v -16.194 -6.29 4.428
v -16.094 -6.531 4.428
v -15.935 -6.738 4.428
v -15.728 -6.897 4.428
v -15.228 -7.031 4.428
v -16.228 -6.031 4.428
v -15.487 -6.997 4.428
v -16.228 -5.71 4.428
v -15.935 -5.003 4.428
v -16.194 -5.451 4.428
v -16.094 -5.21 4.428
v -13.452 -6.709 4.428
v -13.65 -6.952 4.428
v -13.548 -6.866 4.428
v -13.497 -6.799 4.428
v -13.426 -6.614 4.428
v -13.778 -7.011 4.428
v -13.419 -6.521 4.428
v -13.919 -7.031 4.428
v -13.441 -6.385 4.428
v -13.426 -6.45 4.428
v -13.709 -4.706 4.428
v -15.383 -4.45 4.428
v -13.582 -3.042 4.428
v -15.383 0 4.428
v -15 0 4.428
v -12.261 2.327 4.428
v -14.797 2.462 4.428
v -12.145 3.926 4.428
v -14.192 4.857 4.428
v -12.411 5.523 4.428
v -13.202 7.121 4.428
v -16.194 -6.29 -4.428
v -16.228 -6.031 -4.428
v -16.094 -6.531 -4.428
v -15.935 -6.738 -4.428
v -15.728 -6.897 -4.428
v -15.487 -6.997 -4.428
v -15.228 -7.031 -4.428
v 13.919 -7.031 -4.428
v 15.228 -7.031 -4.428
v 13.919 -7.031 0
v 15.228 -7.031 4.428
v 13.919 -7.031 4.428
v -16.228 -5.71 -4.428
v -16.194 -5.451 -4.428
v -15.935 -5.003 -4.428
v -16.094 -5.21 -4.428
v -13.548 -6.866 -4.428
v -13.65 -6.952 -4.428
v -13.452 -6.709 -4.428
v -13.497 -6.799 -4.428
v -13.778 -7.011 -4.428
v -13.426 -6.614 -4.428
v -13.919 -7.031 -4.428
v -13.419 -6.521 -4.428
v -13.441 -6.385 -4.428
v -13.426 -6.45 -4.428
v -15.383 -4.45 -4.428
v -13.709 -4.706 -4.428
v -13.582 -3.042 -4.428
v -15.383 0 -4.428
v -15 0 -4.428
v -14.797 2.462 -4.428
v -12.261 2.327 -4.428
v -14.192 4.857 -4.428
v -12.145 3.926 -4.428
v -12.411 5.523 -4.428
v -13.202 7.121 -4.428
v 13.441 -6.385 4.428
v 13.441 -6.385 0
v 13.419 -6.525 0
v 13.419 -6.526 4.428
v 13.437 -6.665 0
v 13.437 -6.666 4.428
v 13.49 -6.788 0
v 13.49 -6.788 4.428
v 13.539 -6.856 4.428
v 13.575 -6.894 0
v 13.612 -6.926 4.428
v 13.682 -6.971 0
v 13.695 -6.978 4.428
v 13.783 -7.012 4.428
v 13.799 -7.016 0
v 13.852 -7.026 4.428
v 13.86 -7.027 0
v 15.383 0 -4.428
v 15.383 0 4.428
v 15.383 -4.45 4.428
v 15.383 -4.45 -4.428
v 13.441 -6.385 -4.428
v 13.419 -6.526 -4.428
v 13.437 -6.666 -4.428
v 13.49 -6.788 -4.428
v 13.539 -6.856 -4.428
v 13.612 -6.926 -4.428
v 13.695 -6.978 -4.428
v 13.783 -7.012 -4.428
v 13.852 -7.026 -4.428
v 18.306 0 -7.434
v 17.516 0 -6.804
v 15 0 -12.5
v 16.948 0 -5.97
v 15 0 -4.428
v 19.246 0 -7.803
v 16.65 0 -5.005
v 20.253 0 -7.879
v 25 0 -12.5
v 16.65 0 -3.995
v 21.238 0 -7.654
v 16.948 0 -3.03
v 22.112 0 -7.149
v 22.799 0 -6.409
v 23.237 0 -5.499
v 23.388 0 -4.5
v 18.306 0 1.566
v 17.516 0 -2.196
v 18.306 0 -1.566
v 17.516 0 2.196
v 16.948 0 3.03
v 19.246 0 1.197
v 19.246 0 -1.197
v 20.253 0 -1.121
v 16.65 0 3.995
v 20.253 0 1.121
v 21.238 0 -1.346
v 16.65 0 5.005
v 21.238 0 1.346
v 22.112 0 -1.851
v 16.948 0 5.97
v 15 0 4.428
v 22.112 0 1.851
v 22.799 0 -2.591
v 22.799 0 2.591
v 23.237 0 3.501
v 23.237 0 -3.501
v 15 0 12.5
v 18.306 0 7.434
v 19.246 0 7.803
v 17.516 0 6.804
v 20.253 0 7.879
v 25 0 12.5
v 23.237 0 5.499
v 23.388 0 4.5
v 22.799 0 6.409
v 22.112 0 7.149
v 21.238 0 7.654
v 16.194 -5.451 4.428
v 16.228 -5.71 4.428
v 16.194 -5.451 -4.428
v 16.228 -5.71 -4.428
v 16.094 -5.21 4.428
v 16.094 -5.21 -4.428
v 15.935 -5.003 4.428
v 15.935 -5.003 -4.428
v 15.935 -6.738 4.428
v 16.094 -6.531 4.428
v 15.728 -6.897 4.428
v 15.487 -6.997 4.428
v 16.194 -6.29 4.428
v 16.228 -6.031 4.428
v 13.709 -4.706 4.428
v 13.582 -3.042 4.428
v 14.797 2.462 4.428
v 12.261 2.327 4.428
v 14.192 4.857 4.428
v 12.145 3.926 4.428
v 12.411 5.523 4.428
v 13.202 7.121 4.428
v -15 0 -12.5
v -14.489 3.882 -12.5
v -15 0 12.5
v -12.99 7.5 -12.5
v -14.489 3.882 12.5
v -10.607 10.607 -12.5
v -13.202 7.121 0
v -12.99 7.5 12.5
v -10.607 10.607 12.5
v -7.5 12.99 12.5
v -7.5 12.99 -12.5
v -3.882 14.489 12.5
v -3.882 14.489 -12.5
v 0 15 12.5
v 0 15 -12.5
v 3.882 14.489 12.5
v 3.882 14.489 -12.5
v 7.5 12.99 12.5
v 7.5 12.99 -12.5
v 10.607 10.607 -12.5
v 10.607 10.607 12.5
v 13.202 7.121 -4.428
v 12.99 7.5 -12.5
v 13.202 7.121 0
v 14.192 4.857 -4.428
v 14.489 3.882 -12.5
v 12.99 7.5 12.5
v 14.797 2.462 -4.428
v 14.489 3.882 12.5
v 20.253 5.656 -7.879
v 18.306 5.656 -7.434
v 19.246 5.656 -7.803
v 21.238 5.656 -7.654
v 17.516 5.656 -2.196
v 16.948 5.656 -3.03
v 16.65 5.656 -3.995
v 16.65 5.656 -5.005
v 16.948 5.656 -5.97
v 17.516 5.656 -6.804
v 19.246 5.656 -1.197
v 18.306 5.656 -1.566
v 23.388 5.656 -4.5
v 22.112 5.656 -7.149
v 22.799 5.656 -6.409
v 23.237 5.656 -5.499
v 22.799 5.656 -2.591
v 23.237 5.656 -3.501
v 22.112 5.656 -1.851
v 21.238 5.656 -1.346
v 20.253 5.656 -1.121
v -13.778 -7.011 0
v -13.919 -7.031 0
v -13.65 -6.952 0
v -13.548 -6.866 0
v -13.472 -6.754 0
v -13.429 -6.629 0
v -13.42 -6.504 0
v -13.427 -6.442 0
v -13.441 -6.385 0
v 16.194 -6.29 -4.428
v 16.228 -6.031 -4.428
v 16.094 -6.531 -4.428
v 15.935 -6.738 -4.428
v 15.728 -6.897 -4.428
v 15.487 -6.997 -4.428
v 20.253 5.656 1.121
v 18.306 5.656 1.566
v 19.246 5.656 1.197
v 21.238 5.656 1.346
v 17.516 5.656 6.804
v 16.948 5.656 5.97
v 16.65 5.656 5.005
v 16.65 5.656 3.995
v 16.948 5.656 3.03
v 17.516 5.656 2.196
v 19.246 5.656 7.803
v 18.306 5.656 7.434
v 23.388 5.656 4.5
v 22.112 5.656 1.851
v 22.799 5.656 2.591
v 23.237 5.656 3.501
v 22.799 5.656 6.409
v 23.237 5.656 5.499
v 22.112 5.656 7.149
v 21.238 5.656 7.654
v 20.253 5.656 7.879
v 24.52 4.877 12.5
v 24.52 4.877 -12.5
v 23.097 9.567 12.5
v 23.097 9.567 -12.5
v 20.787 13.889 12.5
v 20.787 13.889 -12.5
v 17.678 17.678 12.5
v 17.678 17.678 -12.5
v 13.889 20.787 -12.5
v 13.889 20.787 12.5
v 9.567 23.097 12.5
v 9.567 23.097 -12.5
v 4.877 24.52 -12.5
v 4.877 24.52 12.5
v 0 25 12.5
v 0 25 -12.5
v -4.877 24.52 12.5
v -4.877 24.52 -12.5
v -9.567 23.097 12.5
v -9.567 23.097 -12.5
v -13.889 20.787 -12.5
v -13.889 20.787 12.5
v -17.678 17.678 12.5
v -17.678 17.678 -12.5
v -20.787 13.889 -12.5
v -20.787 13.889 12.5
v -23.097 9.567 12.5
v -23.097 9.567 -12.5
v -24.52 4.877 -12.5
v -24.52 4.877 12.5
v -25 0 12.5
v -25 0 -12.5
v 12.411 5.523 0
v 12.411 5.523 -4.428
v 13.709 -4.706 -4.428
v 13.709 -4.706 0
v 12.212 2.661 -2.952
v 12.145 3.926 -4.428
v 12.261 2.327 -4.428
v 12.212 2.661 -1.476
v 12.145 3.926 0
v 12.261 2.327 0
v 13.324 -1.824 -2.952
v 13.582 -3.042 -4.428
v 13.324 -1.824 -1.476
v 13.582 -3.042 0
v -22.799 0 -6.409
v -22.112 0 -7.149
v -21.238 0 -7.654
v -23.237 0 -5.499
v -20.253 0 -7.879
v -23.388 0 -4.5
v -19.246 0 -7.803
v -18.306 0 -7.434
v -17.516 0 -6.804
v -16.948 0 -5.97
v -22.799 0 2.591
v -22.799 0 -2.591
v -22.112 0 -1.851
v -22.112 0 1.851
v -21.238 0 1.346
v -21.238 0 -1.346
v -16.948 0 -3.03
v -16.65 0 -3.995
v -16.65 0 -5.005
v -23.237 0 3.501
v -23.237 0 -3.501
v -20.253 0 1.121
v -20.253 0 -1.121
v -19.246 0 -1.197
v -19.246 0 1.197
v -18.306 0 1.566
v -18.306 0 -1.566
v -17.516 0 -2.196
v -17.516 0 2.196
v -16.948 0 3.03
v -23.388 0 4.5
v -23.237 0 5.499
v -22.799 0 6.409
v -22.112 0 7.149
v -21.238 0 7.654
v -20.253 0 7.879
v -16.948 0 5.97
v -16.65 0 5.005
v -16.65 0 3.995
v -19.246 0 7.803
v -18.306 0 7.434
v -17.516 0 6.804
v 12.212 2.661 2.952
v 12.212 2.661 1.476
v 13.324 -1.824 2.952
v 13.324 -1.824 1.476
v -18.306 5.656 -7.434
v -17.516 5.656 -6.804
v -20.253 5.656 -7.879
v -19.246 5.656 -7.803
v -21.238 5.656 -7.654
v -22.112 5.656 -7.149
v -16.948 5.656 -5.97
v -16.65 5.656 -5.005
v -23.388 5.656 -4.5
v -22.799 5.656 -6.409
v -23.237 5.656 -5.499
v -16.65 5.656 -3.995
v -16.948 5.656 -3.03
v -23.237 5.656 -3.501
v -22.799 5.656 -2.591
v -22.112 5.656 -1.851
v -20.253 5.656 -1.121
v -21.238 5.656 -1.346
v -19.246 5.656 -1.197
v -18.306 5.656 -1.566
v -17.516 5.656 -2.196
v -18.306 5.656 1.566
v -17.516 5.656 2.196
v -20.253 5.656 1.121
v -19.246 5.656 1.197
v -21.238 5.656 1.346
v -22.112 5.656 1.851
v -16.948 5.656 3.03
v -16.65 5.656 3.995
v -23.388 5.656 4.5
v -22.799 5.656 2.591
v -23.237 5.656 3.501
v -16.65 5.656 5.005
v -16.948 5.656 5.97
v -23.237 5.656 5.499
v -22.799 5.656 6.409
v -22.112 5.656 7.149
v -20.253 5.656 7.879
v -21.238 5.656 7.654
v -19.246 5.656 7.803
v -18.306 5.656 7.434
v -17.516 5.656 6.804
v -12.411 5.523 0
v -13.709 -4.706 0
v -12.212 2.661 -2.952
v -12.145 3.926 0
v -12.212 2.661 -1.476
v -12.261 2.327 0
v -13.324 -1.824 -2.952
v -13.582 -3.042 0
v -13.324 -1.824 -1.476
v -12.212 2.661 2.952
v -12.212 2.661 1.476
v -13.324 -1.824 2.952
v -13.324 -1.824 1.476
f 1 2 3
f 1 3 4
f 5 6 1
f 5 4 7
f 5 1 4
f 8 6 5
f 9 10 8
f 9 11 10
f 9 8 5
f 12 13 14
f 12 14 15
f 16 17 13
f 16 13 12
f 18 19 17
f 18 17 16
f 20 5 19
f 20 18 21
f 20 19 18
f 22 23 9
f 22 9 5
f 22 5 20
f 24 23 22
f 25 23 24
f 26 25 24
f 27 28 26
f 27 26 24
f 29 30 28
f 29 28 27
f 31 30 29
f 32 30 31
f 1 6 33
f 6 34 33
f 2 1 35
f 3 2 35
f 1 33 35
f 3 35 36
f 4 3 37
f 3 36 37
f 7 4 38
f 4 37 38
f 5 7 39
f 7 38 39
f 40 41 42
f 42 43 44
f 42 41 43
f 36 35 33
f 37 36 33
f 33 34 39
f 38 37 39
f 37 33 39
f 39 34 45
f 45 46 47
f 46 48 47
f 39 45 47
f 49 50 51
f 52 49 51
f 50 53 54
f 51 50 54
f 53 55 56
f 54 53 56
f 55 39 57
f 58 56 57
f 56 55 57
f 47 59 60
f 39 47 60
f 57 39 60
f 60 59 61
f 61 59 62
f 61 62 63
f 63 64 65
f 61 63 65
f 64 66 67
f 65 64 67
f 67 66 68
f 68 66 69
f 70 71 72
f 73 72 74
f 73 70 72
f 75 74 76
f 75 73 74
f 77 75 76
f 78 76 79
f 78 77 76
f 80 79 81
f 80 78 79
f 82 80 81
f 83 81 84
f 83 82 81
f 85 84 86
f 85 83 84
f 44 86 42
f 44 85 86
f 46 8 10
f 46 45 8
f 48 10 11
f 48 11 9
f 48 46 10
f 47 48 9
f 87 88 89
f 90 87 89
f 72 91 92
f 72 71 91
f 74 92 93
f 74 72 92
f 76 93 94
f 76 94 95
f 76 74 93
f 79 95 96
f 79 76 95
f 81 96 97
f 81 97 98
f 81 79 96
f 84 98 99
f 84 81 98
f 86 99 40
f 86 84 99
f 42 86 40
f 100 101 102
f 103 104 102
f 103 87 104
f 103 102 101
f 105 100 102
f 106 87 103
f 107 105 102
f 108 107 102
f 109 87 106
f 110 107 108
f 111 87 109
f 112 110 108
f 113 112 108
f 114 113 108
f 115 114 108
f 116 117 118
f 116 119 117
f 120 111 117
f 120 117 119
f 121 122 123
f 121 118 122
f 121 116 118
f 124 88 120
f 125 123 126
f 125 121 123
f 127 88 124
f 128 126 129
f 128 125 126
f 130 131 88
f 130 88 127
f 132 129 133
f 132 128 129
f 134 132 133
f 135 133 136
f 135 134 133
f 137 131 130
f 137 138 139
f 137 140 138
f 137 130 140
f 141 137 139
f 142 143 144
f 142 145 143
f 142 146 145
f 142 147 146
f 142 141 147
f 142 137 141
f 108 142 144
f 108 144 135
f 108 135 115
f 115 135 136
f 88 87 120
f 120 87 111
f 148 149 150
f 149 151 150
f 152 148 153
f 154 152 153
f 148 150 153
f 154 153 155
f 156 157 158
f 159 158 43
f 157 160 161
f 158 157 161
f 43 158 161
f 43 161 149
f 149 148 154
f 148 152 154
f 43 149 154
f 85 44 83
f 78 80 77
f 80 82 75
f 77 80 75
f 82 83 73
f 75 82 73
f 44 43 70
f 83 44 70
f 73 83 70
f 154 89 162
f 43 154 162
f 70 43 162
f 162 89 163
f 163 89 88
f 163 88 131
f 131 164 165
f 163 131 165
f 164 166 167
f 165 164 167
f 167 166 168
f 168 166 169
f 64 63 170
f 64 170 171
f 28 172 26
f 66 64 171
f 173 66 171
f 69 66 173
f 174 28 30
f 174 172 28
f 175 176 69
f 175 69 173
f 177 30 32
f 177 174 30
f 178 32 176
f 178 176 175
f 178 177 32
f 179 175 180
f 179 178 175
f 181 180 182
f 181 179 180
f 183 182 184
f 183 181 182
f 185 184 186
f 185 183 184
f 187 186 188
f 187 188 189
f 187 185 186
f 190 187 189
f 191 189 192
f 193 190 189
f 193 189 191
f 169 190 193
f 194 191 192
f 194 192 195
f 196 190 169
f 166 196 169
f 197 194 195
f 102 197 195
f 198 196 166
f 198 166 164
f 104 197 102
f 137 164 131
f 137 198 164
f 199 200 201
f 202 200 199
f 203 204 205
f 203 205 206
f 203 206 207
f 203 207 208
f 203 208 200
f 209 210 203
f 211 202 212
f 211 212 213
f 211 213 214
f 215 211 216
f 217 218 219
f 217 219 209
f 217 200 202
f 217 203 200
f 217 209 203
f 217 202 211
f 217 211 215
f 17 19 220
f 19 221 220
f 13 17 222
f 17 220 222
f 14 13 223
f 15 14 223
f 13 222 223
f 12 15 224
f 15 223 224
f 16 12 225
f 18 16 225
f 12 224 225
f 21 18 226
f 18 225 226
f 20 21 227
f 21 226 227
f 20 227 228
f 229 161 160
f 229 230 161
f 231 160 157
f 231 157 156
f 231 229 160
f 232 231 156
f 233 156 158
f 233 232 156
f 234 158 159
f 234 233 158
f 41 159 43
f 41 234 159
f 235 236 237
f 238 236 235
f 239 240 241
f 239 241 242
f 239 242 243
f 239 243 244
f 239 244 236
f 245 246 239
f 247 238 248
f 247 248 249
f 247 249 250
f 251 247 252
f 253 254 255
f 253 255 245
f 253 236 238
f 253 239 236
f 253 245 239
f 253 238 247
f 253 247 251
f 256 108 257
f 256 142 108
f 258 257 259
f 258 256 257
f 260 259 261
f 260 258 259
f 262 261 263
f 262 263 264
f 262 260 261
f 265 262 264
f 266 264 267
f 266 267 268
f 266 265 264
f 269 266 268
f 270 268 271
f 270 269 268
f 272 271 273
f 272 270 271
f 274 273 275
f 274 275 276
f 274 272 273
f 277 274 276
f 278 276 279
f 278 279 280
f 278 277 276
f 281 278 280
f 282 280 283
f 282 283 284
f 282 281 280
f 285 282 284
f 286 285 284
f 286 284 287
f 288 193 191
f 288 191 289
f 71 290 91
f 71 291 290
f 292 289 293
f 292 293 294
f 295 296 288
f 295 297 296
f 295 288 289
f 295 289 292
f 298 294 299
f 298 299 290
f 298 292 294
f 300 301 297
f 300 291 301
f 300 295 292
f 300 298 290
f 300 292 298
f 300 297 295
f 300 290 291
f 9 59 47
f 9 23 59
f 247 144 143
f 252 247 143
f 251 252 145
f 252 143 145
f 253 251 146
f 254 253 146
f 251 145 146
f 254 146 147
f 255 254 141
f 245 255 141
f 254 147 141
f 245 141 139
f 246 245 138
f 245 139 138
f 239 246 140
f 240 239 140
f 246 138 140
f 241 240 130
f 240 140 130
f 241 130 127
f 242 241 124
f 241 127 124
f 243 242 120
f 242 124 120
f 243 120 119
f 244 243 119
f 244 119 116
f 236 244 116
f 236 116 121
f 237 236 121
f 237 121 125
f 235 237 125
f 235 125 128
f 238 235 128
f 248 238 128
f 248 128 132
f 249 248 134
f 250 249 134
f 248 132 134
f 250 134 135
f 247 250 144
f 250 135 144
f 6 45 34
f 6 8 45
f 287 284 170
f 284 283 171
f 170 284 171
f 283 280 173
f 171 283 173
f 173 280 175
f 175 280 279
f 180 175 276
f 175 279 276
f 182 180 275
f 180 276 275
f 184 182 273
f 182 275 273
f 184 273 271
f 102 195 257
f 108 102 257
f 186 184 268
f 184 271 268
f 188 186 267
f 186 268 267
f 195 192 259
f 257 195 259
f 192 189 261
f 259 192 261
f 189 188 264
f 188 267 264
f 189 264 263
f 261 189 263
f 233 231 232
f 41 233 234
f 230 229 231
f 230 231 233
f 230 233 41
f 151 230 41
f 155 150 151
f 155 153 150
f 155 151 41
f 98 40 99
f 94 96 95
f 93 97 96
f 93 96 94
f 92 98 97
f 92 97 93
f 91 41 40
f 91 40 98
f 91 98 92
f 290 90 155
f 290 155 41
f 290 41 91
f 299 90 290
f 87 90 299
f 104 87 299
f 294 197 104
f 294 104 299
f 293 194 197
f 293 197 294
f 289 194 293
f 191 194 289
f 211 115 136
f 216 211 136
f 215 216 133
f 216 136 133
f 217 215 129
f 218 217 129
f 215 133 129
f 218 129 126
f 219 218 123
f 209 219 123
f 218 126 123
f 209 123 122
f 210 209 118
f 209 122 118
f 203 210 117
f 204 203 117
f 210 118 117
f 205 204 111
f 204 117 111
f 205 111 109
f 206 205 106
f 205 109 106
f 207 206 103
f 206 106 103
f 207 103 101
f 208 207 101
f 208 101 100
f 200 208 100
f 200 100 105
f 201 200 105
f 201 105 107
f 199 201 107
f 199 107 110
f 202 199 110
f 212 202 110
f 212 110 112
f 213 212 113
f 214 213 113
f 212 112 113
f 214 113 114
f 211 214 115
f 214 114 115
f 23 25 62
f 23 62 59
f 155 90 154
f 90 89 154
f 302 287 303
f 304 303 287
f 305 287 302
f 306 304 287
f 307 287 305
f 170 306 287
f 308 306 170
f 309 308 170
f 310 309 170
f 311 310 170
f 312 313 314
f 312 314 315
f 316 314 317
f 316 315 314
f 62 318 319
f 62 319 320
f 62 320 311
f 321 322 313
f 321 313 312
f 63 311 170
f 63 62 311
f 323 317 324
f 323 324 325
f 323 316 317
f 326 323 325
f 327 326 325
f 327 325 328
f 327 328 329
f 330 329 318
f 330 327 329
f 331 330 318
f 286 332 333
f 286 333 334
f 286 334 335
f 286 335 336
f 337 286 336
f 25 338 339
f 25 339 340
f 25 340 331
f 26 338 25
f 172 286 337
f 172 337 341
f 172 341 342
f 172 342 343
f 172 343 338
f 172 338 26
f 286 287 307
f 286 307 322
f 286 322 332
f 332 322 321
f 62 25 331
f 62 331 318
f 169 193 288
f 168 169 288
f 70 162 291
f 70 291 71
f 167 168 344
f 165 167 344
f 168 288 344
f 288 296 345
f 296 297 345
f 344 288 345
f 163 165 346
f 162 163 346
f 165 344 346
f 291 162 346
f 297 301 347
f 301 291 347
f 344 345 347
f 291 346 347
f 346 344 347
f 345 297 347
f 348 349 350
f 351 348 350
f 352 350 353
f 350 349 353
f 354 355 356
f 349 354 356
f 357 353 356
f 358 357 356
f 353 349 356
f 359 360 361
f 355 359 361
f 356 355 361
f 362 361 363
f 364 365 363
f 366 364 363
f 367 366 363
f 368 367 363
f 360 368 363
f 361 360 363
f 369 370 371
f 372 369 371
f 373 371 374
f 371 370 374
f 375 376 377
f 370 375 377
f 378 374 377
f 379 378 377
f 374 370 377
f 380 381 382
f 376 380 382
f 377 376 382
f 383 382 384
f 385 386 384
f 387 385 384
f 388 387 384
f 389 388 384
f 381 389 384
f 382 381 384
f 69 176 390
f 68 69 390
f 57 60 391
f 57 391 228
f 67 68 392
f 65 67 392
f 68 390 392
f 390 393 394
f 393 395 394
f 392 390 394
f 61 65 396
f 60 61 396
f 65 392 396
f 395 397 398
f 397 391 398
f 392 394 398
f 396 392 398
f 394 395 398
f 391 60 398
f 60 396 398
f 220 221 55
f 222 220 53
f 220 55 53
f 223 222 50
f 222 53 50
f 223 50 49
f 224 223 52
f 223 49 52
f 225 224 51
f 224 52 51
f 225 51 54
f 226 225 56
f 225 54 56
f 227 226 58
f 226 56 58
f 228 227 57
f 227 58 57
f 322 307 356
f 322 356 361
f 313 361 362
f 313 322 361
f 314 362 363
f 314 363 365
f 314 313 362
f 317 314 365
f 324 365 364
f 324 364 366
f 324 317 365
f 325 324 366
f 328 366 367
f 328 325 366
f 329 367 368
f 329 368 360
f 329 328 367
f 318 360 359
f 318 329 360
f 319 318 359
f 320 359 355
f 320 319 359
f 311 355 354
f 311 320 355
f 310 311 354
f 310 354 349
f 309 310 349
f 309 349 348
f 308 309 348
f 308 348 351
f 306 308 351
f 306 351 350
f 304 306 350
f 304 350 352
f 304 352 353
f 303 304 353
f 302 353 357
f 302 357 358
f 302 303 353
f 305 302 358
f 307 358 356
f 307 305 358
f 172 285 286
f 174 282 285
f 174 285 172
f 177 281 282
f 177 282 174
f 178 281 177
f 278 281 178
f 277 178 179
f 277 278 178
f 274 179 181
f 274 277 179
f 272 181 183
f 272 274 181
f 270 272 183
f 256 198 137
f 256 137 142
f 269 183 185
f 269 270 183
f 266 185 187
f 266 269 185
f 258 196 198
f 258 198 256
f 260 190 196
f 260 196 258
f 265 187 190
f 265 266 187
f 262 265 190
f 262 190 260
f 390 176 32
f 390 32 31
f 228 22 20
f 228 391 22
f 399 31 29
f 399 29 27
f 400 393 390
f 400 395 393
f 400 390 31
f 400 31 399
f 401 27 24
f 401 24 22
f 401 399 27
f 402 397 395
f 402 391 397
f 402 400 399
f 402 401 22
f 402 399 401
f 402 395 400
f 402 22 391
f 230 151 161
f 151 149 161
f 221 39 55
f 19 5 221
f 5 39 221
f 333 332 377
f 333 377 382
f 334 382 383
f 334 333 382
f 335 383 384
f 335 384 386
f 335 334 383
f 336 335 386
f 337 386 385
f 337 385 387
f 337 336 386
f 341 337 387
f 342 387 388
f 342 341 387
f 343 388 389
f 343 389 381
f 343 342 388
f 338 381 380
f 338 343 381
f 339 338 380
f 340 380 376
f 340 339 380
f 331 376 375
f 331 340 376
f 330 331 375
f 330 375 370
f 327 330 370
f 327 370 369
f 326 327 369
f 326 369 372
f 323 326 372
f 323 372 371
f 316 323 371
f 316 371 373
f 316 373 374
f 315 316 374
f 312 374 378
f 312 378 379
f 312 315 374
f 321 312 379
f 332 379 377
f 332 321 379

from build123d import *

# Parameters (mm, degrees)
BOSS_EXTRUDE1_DEPTH = 12.5
BOSS_EXTRUDE3_DEPTH = 4.42775
FILLET1_R           = 1
FILLET2_R           = 1
FILLET5_R           = 1
FILLET6_R           = 1
SKETCH4_R           = 3.388
CUT_EXTRUDE1_DEPTH  = 5.656
FILLET7_R           = 0.5


with BuildPart() as part:
    # Sketch1 → Boss-Extrude1 (new body, symmetric)
    with BuildSketch(Plane.XY):
        with BuildLine():
            Line((-25, 0), (-15, 0))
            ThreePointArc((-15, 0), (0, 15), (15, 0))
            Line((15, 0), (25, 0))
            ThreePointArc((25, 0), (0, 25), (-25, 0))
        make_face()
    extrude(amount=BOSS_EXTRUDE1_DEPTH, both=True)

    # Sketch3 → Boss-Extrude3 (add, symmetric)
    with BuildSketch(Plane.XY):
        with BuildLine():
            Line((15.3827, 0), (15.3827, -4.45))
            Line((15.3827, -4.45), (16.2282, -5.2955))
            Line((16.2282, -5.2955), (16.2282, -7.031))
            Line((16.2282, -7.031), (13.2022, -7.031))
            add(Edge.make_bspline(
                [(13.2022, 7.12052773), (9.986819902, 2.44993192), (15.309996934, -2.18235212), (13.2022, -7.031)],
                knots=[0, 0, 0, 0, 1, 1, 1, 1], degree=3))
            ThreePointArc((13.2022, 7.12052773), (14.543606843, 3.671988562), (15, 0))
            Line((15, 0), (15.3827, 0))
        make_face()
    boss_extrude3 = extrude(amount=BOSS_EXTRUDE3_DEPTH, both=True)

    # Mirror11: Boss-Extrude3 across plane
    add(boss_extrude3.mirror(Plane(origin=(0, 0, 0), x_dir=(0, 0, 1), z_dir=(1, 0, 0))))

    # Fillet1
    fillet1_edges = [part.edges().sort_by_distance(p)[0] for p in [
        (16.2282, -7.031, 0),
    ]]
    fillet(fillet1_edges, radius=FILLET1_R)

    # Fillet2
    fillet2_edges = [part.edges().sort_by_distance(p)[0] for p in [
        (-16.2282, -7.031, 0),
    ]]
    fillet(fillet2_edges, radius=FILLET2_R)

    # Fillet5
    fillet5_edges = [part.edges().sort_by_distance(p)[0] for p in [
        (16.2282, -5.2955, 0),
    ]]
    fillet(fillet5_edges, radius=FILLET5_R)

    # Fillet6
    fillet6_edges = [part.edges().sort_by_distance(p)[0] for p in [
        (-16.2282, -5.2955, 0),
    ]]
    fillet(fillet6_edges, radius=FILLET6_R)

    # Sketch4 → Cut-Extrude1 (cut)
    with BuildSketch(Plane.XZ):
        with Locations((20, -4.5)):
            Circle(SKETCH4_R)
        with Locations((20, 4.5)):
            Circle(SKETCH4_R)
    cut_extrude1 = extrude(amount=-CUT_EXTRUDE1_DEPTH, mode=Mode.SUBTRACT)

    # Mirror12: Cut-Extrude1 across plane
    add(cut_extrude1.mirror(Plane(origin=(0, 0, 0), x_dir=(0, 0, 1), z_dir=(1, 0, 0))), mode=Mode.SUBTRACT)

    # Fillet7
    fillet7_edges = [part.edges().sort_by_distance(p)[0] for p in [
        (13.2022, -7.031, 2.213875),
        (-13.2022, -7.031, -2.213875),
    ]]
    fillet(fillet7_edges, radius=FILLET7_R)


solid = part.part
